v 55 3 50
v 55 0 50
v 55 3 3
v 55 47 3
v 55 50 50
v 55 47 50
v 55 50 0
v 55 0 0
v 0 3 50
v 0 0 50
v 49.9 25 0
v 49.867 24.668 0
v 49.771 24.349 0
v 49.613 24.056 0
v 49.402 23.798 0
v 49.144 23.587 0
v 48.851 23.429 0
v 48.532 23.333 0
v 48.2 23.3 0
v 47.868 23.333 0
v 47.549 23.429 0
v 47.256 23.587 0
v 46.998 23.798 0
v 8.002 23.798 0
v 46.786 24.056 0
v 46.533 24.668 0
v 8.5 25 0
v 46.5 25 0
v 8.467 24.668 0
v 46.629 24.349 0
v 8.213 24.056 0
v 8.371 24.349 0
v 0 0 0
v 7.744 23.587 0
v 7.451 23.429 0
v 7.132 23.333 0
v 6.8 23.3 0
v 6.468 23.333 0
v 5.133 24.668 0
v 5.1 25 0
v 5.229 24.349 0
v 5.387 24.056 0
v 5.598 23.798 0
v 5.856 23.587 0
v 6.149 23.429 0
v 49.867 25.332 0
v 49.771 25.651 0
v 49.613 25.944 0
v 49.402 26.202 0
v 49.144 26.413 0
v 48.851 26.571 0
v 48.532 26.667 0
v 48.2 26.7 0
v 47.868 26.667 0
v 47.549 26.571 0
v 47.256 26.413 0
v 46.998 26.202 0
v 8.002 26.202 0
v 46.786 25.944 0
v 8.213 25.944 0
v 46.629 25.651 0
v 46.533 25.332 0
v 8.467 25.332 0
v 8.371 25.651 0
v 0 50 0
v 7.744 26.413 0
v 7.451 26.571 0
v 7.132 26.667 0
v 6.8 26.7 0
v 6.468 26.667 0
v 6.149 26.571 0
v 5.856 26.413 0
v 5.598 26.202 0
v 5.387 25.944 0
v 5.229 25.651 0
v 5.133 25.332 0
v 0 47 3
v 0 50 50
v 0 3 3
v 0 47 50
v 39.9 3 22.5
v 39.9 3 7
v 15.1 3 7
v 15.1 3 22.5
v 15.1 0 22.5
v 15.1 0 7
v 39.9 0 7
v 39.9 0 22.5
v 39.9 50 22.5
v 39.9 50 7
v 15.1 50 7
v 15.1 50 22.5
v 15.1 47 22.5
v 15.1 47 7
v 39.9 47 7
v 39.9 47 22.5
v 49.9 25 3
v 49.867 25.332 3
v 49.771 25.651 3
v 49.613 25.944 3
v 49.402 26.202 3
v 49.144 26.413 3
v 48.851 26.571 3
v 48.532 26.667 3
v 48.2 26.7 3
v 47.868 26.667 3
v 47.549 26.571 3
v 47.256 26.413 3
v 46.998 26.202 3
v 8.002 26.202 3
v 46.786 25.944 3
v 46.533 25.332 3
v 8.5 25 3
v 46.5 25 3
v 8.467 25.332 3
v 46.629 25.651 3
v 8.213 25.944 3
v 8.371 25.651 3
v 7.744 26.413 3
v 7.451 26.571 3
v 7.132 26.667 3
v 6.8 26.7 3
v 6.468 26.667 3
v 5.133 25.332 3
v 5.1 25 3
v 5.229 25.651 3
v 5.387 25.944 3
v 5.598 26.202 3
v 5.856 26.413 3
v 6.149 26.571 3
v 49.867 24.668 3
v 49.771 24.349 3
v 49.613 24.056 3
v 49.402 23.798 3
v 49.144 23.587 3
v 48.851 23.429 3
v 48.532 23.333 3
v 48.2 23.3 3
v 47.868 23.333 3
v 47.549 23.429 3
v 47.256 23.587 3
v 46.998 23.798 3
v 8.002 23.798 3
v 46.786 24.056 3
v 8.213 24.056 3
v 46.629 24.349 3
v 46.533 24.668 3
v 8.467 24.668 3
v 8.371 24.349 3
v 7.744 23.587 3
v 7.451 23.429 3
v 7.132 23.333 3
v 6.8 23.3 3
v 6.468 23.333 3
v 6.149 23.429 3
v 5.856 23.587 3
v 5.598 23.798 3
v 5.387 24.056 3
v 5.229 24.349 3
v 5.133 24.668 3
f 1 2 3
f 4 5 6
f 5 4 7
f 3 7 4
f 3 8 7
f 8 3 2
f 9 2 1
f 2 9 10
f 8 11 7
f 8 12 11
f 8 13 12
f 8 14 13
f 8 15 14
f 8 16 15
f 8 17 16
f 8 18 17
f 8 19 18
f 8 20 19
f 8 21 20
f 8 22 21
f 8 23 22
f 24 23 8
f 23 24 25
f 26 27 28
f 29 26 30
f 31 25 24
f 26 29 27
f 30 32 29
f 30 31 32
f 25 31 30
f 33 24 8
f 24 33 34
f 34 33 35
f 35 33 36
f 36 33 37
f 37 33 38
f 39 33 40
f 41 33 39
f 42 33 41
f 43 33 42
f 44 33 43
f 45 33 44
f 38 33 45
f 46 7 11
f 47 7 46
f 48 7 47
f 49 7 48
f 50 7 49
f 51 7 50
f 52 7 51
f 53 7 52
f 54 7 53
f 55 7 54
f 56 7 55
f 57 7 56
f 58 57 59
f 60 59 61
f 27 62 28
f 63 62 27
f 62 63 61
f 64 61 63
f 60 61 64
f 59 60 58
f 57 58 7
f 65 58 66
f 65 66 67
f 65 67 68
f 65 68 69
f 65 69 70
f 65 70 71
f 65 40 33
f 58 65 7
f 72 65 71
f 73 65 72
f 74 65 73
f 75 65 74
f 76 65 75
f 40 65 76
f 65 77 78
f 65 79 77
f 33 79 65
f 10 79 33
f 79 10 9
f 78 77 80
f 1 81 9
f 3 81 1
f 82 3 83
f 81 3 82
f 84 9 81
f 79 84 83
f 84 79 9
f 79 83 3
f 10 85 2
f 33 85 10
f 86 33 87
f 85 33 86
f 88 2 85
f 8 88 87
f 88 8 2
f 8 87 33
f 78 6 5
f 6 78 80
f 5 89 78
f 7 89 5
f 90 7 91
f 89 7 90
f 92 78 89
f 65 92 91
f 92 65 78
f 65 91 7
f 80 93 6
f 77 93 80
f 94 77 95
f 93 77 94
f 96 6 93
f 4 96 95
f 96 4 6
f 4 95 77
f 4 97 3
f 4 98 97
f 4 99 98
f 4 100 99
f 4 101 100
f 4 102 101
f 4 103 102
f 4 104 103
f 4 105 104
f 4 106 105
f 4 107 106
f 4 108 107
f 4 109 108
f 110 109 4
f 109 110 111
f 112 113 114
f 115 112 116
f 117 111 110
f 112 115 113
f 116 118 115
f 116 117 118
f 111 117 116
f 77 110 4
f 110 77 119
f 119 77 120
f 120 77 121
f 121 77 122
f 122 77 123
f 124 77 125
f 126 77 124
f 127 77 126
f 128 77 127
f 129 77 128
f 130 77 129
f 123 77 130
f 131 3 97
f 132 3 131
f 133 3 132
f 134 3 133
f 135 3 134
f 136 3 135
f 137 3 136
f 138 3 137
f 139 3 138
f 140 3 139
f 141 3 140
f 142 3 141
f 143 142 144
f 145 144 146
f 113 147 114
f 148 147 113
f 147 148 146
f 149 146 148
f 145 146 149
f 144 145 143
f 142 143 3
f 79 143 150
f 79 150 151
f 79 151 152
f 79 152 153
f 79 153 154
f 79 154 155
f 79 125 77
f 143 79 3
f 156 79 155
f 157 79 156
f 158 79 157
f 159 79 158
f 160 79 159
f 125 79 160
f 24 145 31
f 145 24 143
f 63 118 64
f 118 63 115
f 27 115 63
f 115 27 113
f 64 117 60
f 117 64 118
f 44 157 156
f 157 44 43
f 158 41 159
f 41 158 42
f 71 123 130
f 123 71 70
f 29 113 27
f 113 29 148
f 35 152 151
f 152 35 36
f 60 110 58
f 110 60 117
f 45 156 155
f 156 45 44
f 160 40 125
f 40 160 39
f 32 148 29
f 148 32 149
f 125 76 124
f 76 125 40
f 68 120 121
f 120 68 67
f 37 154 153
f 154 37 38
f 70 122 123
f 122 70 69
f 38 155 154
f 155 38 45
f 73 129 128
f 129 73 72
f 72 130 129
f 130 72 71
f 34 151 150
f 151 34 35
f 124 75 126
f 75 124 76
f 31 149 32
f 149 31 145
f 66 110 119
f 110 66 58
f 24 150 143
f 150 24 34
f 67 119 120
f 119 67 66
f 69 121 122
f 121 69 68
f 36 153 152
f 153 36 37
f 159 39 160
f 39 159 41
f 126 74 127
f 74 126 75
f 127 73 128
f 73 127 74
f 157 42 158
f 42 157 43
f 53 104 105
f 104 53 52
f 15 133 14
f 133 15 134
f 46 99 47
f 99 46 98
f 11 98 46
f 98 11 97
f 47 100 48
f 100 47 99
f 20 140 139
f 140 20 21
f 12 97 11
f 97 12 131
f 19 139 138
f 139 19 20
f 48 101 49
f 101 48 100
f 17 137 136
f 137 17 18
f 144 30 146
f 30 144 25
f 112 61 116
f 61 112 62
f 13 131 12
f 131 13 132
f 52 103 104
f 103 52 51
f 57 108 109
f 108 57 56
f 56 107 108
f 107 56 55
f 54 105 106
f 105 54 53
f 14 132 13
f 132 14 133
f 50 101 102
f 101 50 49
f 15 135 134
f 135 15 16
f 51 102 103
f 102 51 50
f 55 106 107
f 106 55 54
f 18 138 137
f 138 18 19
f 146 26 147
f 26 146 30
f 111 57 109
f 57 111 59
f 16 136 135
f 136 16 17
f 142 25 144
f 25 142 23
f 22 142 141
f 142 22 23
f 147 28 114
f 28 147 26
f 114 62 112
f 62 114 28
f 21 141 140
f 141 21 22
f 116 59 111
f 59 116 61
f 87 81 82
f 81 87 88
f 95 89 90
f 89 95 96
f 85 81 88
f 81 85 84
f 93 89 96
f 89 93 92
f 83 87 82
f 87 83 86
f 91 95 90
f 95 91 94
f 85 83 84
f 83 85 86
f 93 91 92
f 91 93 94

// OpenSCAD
$fn = 32;

// ----------------------------------------------------------------------
// U-bracket: 55 x 50 x 50 mm
// ----------------------------------------------------------------------

// --- parameters (mm) ---
span = 55;                // outer length, X
outer_w = 50;             // outer width, Y
wall_h = 50;              // upright height, Z
plate_t = 3;              // wall thickness
hole_d = 3.4;             // clearance for M3
window_l = 24.8;          // window length
window_h = 15.5;          // window height

module hole_z(px, py) {
  translate([px, py, -2.5]) cylinder(h = plate_t + 5, d = hole_d);
}
module hole_y_pz(pz) {
  /* through both uprights along Y */
  translate([0, -2.5, pz]) rotate([-90, 0, 0]) cylinder(h = outer_w + 5, d = hole_d);
}

module base() {
  cube([span, outer_w, plate_t]);
}

module uprights() {
  cube([span, plate_t, wall_h]);
  translate([0, outer_w - plate_t, 0]) cube([span, plate_t, wall_h]);
}

difference() {
  union() {
    base();
    uprights();
  }
  hole_z(6.8, 25);
  hole_z(48.2, 25);
  /* lightening window through both uprights */
  translate([span / 2 - window_l / 2, -1, plate_t + 4])
    cube([window_l, outer_w + 2, window_h]);
}
